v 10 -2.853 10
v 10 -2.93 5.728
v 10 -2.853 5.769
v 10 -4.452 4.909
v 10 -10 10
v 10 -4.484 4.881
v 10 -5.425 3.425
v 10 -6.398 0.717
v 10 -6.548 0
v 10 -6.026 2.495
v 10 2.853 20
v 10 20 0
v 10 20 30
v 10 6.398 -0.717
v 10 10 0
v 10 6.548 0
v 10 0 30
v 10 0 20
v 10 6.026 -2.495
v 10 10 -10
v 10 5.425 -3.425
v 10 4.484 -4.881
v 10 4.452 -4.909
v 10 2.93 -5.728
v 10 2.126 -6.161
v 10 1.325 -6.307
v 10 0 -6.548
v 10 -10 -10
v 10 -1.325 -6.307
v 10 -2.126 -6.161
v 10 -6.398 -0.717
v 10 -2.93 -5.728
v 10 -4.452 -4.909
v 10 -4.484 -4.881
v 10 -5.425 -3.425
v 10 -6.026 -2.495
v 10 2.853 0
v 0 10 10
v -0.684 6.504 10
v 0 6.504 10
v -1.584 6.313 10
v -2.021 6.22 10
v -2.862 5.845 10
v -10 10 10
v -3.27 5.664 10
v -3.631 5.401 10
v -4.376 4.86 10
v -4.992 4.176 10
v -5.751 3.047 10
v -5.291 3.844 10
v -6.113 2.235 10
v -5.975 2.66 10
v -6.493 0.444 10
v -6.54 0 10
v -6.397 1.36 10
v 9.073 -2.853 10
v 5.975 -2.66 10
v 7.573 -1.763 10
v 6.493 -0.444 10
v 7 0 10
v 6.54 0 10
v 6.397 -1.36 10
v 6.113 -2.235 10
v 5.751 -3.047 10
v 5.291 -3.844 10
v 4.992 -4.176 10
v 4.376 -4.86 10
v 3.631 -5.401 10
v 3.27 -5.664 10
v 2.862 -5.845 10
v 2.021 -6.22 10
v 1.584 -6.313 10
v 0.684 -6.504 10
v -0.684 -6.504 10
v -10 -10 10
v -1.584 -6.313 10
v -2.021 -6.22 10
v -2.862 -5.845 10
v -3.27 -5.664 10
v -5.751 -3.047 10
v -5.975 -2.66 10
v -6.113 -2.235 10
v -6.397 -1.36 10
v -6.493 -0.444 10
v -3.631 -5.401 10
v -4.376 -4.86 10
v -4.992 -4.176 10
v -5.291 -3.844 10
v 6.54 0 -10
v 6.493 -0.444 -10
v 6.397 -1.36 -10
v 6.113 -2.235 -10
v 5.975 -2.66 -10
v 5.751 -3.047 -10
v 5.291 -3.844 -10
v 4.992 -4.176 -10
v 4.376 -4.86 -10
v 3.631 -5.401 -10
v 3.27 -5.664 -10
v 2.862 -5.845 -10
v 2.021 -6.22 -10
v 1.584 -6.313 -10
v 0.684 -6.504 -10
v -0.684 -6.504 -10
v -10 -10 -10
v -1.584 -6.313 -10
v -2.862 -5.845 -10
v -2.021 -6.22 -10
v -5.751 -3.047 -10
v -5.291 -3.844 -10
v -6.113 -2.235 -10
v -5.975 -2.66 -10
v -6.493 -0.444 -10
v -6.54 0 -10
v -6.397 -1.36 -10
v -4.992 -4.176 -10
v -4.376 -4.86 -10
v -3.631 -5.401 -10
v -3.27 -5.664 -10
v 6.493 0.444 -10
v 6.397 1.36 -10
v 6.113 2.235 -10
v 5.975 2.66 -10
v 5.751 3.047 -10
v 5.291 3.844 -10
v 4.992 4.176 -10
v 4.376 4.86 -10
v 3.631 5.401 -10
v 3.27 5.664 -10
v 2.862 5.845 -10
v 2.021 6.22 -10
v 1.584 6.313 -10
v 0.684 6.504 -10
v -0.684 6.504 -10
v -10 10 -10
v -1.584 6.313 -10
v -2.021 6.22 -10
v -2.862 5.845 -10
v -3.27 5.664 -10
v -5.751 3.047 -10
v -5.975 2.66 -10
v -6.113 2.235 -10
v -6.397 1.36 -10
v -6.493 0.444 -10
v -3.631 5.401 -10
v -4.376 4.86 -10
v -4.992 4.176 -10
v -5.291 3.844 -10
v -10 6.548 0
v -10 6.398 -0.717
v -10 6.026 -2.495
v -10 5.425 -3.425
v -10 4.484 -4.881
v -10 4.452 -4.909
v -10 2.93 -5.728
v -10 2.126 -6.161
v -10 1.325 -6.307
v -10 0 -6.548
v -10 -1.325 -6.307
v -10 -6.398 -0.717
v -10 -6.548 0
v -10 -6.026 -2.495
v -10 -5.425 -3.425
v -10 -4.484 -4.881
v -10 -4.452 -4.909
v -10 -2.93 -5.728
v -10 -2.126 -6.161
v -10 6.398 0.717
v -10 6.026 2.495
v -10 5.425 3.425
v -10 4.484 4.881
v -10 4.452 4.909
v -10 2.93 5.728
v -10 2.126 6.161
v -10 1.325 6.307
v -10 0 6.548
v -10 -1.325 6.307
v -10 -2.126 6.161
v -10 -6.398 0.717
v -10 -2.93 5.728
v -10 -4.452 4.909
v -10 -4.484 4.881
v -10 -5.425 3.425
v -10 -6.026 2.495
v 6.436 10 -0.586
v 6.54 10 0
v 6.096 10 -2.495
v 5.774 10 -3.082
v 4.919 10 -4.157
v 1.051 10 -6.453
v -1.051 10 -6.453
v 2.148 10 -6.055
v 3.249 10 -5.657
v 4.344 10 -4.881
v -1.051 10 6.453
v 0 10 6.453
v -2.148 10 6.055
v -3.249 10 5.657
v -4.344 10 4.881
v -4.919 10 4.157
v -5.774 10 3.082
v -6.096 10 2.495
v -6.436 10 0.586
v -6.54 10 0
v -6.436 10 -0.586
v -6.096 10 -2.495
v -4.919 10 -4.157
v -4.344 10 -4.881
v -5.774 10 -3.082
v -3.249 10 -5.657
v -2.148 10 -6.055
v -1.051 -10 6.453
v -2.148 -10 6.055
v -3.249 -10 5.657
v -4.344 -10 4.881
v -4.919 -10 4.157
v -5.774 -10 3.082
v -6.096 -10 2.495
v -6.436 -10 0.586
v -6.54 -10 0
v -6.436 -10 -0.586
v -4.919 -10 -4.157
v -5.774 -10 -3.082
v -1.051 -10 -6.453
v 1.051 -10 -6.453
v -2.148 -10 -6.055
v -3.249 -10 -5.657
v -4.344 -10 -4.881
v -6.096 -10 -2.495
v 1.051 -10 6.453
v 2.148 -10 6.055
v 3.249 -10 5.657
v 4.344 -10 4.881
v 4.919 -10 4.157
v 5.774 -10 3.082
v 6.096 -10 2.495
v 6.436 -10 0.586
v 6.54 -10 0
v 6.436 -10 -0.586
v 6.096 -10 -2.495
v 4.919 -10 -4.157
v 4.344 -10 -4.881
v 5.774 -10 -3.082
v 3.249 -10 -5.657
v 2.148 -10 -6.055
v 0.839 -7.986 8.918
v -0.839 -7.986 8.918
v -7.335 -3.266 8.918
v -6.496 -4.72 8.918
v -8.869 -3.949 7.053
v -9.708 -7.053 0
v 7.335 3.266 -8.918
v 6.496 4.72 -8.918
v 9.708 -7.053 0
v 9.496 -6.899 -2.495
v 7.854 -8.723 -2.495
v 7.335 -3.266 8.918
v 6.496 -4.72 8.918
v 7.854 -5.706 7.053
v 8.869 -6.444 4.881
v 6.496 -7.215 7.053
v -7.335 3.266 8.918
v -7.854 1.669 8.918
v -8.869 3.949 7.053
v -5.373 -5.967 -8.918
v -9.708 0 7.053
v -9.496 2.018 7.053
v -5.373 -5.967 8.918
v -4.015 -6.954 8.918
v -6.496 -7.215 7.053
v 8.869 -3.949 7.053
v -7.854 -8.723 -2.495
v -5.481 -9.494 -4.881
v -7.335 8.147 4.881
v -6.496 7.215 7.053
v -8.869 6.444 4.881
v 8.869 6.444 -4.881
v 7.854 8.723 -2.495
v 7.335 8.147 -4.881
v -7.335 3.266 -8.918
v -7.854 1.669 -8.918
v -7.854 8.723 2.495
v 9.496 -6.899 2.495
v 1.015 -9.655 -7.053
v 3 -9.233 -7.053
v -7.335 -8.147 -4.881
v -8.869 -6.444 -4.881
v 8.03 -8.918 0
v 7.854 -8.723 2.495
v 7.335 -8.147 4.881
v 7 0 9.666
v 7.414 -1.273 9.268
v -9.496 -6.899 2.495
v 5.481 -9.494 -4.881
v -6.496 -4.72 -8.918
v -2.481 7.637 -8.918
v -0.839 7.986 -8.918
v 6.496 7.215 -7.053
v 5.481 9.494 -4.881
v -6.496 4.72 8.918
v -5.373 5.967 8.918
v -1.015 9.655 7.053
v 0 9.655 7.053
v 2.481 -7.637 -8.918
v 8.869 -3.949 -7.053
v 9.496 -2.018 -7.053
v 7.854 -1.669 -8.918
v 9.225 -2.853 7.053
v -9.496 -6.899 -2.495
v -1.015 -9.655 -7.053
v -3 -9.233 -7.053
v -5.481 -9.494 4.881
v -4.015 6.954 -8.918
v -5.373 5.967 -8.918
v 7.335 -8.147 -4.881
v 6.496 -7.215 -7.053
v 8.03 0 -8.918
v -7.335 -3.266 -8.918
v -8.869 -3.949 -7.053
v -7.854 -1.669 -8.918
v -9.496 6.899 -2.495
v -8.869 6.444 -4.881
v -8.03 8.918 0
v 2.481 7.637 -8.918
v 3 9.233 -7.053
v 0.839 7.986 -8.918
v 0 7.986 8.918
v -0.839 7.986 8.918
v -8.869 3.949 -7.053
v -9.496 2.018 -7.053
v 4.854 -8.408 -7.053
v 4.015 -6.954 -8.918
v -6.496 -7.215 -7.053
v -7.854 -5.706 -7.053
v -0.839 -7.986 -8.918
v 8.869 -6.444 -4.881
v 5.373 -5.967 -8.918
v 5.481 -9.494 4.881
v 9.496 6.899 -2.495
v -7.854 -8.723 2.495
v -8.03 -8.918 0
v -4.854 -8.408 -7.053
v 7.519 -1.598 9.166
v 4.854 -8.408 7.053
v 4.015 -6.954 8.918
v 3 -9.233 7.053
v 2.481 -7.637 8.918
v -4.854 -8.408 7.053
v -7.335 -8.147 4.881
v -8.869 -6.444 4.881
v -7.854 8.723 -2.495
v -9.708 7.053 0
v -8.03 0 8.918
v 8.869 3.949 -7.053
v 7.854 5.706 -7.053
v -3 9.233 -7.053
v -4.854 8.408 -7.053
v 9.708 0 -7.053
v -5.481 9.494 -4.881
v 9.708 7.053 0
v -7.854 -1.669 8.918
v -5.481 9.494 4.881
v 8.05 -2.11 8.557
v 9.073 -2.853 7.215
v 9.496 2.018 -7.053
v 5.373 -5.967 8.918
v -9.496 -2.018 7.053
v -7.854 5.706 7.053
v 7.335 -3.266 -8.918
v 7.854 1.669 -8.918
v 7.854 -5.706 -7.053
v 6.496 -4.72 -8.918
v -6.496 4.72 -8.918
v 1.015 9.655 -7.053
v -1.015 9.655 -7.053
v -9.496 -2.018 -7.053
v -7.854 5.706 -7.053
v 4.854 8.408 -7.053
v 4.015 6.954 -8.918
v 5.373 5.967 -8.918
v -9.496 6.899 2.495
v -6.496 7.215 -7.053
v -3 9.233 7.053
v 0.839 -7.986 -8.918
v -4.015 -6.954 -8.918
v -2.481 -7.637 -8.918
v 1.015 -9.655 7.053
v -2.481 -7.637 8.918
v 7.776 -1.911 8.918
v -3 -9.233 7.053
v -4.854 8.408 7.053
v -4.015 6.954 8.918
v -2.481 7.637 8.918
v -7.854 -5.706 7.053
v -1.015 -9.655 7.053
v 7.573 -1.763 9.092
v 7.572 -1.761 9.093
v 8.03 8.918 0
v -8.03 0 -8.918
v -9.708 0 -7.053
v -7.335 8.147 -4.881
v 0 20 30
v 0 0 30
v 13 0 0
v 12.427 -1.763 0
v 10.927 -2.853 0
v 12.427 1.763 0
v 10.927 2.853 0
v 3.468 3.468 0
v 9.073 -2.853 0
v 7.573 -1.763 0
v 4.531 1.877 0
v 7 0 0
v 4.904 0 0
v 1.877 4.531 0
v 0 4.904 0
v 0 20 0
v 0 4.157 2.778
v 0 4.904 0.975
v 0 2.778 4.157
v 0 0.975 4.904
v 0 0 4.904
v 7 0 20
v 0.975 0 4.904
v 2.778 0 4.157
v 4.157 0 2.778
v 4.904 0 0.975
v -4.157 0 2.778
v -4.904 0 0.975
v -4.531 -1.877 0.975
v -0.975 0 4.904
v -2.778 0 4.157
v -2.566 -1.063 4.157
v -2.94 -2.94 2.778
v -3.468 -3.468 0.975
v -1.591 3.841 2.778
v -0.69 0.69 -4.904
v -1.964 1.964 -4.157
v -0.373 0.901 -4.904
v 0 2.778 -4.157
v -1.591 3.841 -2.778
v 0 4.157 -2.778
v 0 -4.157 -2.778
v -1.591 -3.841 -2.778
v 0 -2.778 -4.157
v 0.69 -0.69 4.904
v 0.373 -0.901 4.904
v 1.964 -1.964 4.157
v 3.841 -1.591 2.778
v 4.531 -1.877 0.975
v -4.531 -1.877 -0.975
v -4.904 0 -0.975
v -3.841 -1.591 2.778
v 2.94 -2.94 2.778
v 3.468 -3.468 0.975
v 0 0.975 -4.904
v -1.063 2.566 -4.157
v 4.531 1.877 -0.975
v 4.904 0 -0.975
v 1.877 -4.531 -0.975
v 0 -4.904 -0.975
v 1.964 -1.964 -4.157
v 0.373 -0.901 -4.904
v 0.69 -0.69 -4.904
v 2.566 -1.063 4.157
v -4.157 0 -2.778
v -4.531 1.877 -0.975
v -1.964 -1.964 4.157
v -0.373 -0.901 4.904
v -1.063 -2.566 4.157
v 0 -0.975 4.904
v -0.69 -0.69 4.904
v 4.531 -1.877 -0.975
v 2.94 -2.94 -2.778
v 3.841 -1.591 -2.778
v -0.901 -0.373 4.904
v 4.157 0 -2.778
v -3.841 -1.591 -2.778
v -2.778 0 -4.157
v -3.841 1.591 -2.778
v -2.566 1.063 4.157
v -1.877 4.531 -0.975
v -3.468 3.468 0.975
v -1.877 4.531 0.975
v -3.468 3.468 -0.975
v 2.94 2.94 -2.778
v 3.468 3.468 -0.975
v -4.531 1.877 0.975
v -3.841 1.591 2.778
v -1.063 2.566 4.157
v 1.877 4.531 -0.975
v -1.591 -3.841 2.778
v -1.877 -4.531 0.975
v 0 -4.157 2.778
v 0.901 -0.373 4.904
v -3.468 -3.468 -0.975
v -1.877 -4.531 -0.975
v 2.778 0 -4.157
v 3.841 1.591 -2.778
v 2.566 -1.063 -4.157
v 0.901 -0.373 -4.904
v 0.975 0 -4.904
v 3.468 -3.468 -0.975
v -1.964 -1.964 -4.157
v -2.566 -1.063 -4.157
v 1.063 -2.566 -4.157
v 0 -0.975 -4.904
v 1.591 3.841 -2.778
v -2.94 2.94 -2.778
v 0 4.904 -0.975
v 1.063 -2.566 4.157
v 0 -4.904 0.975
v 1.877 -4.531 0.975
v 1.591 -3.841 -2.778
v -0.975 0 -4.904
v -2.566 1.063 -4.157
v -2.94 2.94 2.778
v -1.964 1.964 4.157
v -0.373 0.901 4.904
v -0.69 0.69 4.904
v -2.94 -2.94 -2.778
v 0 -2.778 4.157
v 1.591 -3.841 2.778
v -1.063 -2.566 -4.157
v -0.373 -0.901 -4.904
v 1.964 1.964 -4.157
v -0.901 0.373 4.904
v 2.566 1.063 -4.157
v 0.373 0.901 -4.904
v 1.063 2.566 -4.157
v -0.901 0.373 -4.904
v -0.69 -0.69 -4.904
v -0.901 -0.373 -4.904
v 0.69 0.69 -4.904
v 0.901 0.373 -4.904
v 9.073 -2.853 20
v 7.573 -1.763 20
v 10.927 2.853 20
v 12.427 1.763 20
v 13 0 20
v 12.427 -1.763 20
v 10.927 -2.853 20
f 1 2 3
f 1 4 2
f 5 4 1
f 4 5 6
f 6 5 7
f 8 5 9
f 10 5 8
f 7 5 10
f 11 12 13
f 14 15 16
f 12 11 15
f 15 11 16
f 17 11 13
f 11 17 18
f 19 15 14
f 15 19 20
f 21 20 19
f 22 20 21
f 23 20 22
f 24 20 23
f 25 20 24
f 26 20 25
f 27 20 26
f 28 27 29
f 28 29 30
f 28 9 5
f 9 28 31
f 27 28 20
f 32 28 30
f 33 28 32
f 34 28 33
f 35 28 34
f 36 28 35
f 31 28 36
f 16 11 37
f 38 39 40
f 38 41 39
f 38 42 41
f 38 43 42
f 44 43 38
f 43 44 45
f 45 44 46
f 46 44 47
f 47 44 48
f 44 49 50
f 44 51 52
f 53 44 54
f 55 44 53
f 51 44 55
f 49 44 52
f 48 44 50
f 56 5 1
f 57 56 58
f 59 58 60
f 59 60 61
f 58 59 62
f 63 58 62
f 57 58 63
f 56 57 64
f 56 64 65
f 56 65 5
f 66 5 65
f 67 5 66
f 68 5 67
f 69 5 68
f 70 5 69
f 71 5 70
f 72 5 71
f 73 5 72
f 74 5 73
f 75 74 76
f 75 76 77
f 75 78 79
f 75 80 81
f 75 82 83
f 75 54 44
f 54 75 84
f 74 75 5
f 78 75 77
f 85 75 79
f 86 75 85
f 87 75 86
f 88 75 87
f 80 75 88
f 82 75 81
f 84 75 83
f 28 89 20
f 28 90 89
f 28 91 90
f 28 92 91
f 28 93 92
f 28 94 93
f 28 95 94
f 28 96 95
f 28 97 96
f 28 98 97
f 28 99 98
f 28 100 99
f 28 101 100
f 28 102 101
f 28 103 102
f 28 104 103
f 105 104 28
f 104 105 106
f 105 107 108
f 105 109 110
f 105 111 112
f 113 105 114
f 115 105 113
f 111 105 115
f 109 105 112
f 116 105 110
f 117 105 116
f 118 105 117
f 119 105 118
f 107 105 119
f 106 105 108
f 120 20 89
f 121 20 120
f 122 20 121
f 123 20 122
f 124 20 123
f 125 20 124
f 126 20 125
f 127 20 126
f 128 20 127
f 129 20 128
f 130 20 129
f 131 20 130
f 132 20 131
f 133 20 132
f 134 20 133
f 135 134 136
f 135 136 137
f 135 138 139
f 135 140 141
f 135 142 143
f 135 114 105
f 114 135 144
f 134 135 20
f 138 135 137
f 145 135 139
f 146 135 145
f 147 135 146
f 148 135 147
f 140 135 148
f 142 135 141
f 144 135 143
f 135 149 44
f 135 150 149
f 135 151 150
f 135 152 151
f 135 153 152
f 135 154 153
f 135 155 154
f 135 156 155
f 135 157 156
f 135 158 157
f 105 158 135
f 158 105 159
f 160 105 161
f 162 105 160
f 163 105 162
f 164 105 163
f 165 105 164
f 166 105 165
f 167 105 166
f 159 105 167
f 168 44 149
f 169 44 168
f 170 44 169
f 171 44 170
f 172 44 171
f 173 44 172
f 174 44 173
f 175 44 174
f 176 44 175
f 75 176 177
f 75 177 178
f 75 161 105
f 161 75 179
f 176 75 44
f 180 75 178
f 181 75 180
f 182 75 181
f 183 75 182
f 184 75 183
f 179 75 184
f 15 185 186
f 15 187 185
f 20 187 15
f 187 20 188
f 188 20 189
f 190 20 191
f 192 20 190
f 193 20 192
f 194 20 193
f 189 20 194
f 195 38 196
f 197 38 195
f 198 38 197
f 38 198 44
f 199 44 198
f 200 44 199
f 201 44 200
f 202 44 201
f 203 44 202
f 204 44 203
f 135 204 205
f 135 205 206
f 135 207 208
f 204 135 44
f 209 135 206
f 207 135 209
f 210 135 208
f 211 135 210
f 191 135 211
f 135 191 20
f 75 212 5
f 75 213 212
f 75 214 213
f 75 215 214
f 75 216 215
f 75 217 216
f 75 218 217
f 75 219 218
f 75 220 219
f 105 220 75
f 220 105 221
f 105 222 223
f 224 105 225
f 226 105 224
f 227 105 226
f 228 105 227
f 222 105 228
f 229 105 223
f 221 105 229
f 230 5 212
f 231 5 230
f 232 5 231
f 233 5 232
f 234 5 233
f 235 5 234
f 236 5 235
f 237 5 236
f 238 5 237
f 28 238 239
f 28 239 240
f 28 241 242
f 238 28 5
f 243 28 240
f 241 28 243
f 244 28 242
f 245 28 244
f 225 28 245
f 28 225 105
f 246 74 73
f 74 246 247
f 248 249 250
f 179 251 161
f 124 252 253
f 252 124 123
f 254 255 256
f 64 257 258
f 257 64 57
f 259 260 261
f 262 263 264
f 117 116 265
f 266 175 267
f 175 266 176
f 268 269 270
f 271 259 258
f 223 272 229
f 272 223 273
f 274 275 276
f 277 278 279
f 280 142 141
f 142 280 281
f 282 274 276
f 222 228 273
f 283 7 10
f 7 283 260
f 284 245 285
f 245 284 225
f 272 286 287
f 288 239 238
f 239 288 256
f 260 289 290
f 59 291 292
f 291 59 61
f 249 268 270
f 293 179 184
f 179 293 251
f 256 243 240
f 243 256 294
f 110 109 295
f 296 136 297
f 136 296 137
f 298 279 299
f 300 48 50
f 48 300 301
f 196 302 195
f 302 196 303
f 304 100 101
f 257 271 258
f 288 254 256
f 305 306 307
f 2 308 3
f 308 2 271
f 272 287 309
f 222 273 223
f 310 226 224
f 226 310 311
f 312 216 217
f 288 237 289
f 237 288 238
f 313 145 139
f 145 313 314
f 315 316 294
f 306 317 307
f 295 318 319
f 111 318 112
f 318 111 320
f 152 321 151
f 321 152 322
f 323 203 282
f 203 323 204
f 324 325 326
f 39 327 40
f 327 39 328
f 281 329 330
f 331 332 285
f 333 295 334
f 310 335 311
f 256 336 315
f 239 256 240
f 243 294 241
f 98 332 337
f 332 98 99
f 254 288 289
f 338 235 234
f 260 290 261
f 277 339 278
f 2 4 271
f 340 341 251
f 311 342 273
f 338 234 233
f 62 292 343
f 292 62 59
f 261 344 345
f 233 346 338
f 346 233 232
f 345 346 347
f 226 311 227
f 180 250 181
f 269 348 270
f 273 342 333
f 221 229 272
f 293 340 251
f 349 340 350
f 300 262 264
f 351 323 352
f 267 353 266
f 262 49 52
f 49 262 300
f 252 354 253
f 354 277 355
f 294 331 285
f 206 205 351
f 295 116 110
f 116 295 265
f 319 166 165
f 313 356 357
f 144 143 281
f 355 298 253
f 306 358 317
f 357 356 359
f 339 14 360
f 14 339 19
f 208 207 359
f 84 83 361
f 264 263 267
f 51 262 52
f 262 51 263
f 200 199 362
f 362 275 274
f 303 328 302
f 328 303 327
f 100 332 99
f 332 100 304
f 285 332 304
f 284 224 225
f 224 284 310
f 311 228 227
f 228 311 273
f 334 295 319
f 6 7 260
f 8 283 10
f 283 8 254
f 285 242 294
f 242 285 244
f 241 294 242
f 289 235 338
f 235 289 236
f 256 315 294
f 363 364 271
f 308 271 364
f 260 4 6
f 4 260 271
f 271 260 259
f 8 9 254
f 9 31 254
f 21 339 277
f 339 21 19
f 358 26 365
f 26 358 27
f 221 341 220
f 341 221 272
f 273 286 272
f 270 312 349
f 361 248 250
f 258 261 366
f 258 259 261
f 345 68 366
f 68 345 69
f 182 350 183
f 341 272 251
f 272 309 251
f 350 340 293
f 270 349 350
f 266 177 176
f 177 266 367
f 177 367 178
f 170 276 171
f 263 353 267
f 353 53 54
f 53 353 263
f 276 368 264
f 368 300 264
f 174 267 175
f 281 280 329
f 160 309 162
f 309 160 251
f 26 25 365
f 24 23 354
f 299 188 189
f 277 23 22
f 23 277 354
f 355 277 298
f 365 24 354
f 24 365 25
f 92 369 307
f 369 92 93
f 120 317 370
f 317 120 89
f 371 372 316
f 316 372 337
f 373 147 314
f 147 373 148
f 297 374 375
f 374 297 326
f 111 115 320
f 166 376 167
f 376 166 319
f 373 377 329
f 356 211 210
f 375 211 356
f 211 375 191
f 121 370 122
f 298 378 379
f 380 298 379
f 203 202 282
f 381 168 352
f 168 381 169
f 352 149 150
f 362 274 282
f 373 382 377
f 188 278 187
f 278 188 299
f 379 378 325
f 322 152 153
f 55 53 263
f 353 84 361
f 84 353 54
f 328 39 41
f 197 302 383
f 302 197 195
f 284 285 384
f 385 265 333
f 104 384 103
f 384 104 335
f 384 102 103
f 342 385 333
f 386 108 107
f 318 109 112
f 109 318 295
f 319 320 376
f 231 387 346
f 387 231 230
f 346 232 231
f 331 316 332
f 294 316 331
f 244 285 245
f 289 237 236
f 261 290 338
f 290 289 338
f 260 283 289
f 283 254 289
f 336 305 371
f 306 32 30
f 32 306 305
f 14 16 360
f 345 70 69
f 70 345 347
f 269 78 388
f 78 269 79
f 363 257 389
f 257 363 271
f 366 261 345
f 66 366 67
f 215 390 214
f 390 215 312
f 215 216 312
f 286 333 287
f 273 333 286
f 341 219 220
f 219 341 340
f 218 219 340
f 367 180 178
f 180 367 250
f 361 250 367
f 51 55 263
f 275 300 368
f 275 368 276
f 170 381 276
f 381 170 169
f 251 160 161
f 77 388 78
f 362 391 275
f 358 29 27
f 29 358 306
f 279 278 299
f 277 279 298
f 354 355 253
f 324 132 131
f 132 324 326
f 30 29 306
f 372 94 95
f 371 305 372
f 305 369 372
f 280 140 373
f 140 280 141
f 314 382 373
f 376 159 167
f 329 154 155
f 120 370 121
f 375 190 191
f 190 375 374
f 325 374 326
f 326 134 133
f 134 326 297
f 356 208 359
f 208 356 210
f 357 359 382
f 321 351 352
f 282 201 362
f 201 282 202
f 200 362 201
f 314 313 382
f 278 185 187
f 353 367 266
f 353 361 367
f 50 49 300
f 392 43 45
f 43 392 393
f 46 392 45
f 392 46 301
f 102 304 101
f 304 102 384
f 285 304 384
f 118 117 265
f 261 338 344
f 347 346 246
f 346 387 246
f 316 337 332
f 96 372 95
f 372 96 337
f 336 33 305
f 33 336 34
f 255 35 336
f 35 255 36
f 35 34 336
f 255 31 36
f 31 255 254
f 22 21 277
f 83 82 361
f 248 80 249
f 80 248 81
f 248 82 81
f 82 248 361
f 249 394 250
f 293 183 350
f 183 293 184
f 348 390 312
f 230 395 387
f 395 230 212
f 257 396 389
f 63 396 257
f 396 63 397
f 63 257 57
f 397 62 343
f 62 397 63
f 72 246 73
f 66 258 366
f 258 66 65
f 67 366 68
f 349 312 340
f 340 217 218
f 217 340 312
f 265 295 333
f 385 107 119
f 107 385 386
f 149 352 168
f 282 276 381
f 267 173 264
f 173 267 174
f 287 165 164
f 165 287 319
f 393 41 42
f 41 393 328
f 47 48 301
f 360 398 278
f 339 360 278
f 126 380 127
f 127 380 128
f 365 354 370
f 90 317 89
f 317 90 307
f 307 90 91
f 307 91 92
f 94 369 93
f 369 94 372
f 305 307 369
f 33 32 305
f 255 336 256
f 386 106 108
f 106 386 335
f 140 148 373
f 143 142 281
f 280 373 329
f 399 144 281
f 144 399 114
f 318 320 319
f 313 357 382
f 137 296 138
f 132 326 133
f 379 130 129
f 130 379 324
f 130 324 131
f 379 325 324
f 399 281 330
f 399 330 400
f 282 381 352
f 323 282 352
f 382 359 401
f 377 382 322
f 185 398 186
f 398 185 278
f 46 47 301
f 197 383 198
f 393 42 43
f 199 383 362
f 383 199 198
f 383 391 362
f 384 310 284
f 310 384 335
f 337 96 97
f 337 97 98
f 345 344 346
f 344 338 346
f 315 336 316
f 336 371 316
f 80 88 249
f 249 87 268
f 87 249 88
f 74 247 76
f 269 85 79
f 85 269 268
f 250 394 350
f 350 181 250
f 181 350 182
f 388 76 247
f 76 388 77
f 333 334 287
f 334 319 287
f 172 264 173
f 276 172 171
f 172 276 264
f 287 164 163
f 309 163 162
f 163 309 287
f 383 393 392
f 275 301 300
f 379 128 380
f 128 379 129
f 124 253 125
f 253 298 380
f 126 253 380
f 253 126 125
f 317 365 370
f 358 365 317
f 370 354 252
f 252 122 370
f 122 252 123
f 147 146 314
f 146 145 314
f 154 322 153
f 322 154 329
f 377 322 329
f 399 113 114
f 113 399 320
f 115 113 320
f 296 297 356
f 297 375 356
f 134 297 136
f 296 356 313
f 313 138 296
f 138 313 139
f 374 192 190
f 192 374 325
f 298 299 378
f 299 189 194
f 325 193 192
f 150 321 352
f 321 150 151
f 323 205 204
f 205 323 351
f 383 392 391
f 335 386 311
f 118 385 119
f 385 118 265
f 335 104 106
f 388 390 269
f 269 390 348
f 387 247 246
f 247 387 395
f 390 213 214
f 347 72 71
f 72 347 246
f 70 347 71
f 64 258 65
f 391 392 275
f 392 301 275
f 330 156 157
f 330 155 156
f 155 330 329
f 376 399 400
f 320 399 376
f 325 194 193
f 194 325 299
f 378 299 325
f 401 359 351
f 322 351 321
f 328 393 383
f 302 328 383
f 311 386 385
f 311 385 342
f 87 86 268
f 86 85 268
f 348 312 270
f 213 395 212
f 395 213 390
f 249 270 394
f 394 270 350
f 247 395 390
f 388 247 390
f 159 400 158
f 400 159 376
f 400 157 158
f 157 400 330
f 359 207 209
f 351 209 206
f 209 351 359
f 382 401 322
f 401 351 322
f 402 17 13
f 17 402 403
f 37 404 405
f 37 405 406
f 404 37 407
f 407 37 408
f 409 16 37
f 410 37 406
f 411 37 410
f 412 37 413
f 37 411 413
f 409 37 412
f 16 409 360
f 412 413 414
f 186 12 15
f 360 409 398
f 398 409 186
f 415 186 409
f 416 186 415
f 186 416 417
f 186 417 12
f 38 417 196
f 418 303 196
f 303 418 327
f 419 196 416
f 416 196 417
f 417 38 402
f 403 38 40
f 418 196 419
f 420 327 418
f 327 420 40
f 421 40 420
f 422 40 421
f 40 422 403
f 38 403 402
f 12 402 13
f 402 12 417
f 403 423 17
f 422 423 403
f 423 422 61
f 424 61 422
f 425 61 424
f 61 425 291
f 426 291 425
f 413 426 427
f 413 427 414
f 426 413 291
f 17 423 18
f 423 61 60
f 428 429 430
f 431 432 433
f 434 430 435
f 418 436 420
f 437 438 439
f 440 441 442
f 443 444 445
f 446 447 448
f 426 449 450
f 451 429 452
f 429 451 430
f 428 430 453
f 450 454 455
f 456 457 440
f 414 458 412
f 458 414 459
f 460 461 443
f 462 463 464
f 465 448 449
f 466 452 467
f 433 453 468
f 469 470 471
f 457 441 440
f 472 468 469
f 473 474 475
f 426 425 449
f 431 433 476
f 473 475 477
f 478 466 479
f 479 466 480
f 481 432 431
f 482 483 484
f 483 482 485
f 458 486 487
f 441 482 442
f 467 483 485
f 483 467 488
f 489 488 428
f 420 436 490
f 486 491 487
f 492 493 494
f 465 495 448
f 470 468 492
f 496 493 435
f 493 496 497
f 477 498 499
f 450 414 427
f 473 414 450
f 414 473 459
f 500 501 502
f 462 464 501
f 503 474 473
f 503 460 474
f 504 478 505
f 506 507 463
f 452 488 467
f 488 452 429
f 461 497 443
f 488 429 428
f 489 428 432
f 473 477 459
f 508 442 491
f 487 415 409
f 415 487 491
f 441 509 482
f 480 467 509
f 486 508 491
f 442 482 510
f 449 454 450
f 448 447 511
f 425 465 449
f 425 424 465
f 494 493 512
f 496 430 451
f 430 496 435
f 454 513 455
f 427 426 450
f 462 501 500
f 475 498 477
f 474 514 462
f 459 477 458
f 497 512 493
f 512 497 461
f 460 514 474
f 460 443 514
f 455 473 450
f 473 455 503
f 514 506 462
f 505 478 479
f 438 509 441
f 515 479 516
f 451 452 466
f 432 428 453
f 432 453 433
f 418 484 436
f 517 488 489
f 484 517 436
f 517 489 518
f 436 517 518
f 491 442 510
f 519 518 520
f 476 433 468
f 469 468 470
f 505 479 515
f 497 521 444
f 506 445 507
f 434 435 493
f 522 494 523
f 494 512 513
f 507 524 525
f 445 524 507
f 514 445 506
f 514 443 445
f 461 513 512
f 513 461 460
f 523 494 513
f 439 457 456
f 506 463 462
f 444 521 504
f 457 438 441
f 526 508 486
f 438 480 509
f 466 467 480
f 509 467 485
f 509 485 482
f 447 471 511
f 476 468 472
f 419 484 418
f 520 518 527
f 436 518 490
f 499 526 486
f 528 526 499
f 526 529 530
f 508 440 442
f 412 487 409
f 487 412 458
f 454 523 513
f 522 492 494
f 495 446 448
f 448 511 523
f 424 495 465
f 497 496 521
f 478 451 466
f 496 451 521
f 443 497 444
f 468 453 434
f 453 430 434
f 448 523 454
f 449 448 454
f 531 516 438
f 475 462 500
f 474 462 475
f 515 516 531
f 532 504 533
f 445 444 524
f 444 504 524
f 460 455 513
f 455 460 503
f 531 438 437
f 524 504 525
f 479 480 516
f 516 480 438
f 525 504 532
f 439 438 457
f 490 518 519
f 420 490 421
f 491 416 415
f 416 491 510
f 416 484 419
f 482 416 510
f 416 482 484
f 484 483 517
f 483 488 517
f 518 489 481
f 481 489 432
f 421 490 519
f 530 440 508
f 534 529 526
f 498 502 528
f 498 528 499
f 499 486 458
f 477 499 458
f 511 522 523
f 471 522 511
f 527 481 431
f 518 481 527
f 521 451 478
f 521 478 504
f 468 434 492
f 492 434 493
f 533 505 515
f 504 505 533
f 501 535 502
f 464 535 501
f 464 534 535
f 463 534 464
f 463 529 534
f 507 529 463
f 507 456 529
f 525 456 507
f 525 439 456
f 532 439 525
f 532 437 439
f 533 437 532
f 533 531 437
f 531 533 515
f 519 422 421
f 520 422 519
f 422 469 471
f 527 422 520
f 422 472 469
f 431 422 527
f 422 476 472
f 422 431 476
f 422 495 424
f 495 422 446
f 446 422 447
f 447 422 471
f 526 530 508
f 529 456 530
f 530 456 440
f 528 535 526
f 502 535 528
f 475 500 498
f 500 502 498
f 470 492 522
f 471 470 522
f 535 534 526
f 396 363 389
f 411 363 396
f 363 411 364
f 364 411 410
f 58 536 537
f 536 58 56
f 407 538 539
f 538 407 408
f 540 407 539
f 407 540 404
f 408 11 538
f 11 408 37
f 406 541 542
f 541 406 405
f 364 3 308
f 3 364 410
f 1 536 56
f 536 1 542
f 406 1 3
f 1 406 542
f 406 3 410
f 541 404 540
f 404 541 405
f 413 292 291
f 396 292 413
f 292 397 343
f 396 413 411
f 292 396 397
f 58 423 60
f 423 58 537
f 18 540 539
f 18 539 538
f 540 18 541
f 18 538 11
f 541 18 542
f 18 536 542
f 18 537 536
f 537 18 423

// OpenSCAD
// Simple test file
cube([10, 20, 30]);
sphere(r=5);

translate([10, 0, 0])
  cylinder(h=20, r=3);

difference() {
  cube(20, center=true);
  sphere(r=12);
}
